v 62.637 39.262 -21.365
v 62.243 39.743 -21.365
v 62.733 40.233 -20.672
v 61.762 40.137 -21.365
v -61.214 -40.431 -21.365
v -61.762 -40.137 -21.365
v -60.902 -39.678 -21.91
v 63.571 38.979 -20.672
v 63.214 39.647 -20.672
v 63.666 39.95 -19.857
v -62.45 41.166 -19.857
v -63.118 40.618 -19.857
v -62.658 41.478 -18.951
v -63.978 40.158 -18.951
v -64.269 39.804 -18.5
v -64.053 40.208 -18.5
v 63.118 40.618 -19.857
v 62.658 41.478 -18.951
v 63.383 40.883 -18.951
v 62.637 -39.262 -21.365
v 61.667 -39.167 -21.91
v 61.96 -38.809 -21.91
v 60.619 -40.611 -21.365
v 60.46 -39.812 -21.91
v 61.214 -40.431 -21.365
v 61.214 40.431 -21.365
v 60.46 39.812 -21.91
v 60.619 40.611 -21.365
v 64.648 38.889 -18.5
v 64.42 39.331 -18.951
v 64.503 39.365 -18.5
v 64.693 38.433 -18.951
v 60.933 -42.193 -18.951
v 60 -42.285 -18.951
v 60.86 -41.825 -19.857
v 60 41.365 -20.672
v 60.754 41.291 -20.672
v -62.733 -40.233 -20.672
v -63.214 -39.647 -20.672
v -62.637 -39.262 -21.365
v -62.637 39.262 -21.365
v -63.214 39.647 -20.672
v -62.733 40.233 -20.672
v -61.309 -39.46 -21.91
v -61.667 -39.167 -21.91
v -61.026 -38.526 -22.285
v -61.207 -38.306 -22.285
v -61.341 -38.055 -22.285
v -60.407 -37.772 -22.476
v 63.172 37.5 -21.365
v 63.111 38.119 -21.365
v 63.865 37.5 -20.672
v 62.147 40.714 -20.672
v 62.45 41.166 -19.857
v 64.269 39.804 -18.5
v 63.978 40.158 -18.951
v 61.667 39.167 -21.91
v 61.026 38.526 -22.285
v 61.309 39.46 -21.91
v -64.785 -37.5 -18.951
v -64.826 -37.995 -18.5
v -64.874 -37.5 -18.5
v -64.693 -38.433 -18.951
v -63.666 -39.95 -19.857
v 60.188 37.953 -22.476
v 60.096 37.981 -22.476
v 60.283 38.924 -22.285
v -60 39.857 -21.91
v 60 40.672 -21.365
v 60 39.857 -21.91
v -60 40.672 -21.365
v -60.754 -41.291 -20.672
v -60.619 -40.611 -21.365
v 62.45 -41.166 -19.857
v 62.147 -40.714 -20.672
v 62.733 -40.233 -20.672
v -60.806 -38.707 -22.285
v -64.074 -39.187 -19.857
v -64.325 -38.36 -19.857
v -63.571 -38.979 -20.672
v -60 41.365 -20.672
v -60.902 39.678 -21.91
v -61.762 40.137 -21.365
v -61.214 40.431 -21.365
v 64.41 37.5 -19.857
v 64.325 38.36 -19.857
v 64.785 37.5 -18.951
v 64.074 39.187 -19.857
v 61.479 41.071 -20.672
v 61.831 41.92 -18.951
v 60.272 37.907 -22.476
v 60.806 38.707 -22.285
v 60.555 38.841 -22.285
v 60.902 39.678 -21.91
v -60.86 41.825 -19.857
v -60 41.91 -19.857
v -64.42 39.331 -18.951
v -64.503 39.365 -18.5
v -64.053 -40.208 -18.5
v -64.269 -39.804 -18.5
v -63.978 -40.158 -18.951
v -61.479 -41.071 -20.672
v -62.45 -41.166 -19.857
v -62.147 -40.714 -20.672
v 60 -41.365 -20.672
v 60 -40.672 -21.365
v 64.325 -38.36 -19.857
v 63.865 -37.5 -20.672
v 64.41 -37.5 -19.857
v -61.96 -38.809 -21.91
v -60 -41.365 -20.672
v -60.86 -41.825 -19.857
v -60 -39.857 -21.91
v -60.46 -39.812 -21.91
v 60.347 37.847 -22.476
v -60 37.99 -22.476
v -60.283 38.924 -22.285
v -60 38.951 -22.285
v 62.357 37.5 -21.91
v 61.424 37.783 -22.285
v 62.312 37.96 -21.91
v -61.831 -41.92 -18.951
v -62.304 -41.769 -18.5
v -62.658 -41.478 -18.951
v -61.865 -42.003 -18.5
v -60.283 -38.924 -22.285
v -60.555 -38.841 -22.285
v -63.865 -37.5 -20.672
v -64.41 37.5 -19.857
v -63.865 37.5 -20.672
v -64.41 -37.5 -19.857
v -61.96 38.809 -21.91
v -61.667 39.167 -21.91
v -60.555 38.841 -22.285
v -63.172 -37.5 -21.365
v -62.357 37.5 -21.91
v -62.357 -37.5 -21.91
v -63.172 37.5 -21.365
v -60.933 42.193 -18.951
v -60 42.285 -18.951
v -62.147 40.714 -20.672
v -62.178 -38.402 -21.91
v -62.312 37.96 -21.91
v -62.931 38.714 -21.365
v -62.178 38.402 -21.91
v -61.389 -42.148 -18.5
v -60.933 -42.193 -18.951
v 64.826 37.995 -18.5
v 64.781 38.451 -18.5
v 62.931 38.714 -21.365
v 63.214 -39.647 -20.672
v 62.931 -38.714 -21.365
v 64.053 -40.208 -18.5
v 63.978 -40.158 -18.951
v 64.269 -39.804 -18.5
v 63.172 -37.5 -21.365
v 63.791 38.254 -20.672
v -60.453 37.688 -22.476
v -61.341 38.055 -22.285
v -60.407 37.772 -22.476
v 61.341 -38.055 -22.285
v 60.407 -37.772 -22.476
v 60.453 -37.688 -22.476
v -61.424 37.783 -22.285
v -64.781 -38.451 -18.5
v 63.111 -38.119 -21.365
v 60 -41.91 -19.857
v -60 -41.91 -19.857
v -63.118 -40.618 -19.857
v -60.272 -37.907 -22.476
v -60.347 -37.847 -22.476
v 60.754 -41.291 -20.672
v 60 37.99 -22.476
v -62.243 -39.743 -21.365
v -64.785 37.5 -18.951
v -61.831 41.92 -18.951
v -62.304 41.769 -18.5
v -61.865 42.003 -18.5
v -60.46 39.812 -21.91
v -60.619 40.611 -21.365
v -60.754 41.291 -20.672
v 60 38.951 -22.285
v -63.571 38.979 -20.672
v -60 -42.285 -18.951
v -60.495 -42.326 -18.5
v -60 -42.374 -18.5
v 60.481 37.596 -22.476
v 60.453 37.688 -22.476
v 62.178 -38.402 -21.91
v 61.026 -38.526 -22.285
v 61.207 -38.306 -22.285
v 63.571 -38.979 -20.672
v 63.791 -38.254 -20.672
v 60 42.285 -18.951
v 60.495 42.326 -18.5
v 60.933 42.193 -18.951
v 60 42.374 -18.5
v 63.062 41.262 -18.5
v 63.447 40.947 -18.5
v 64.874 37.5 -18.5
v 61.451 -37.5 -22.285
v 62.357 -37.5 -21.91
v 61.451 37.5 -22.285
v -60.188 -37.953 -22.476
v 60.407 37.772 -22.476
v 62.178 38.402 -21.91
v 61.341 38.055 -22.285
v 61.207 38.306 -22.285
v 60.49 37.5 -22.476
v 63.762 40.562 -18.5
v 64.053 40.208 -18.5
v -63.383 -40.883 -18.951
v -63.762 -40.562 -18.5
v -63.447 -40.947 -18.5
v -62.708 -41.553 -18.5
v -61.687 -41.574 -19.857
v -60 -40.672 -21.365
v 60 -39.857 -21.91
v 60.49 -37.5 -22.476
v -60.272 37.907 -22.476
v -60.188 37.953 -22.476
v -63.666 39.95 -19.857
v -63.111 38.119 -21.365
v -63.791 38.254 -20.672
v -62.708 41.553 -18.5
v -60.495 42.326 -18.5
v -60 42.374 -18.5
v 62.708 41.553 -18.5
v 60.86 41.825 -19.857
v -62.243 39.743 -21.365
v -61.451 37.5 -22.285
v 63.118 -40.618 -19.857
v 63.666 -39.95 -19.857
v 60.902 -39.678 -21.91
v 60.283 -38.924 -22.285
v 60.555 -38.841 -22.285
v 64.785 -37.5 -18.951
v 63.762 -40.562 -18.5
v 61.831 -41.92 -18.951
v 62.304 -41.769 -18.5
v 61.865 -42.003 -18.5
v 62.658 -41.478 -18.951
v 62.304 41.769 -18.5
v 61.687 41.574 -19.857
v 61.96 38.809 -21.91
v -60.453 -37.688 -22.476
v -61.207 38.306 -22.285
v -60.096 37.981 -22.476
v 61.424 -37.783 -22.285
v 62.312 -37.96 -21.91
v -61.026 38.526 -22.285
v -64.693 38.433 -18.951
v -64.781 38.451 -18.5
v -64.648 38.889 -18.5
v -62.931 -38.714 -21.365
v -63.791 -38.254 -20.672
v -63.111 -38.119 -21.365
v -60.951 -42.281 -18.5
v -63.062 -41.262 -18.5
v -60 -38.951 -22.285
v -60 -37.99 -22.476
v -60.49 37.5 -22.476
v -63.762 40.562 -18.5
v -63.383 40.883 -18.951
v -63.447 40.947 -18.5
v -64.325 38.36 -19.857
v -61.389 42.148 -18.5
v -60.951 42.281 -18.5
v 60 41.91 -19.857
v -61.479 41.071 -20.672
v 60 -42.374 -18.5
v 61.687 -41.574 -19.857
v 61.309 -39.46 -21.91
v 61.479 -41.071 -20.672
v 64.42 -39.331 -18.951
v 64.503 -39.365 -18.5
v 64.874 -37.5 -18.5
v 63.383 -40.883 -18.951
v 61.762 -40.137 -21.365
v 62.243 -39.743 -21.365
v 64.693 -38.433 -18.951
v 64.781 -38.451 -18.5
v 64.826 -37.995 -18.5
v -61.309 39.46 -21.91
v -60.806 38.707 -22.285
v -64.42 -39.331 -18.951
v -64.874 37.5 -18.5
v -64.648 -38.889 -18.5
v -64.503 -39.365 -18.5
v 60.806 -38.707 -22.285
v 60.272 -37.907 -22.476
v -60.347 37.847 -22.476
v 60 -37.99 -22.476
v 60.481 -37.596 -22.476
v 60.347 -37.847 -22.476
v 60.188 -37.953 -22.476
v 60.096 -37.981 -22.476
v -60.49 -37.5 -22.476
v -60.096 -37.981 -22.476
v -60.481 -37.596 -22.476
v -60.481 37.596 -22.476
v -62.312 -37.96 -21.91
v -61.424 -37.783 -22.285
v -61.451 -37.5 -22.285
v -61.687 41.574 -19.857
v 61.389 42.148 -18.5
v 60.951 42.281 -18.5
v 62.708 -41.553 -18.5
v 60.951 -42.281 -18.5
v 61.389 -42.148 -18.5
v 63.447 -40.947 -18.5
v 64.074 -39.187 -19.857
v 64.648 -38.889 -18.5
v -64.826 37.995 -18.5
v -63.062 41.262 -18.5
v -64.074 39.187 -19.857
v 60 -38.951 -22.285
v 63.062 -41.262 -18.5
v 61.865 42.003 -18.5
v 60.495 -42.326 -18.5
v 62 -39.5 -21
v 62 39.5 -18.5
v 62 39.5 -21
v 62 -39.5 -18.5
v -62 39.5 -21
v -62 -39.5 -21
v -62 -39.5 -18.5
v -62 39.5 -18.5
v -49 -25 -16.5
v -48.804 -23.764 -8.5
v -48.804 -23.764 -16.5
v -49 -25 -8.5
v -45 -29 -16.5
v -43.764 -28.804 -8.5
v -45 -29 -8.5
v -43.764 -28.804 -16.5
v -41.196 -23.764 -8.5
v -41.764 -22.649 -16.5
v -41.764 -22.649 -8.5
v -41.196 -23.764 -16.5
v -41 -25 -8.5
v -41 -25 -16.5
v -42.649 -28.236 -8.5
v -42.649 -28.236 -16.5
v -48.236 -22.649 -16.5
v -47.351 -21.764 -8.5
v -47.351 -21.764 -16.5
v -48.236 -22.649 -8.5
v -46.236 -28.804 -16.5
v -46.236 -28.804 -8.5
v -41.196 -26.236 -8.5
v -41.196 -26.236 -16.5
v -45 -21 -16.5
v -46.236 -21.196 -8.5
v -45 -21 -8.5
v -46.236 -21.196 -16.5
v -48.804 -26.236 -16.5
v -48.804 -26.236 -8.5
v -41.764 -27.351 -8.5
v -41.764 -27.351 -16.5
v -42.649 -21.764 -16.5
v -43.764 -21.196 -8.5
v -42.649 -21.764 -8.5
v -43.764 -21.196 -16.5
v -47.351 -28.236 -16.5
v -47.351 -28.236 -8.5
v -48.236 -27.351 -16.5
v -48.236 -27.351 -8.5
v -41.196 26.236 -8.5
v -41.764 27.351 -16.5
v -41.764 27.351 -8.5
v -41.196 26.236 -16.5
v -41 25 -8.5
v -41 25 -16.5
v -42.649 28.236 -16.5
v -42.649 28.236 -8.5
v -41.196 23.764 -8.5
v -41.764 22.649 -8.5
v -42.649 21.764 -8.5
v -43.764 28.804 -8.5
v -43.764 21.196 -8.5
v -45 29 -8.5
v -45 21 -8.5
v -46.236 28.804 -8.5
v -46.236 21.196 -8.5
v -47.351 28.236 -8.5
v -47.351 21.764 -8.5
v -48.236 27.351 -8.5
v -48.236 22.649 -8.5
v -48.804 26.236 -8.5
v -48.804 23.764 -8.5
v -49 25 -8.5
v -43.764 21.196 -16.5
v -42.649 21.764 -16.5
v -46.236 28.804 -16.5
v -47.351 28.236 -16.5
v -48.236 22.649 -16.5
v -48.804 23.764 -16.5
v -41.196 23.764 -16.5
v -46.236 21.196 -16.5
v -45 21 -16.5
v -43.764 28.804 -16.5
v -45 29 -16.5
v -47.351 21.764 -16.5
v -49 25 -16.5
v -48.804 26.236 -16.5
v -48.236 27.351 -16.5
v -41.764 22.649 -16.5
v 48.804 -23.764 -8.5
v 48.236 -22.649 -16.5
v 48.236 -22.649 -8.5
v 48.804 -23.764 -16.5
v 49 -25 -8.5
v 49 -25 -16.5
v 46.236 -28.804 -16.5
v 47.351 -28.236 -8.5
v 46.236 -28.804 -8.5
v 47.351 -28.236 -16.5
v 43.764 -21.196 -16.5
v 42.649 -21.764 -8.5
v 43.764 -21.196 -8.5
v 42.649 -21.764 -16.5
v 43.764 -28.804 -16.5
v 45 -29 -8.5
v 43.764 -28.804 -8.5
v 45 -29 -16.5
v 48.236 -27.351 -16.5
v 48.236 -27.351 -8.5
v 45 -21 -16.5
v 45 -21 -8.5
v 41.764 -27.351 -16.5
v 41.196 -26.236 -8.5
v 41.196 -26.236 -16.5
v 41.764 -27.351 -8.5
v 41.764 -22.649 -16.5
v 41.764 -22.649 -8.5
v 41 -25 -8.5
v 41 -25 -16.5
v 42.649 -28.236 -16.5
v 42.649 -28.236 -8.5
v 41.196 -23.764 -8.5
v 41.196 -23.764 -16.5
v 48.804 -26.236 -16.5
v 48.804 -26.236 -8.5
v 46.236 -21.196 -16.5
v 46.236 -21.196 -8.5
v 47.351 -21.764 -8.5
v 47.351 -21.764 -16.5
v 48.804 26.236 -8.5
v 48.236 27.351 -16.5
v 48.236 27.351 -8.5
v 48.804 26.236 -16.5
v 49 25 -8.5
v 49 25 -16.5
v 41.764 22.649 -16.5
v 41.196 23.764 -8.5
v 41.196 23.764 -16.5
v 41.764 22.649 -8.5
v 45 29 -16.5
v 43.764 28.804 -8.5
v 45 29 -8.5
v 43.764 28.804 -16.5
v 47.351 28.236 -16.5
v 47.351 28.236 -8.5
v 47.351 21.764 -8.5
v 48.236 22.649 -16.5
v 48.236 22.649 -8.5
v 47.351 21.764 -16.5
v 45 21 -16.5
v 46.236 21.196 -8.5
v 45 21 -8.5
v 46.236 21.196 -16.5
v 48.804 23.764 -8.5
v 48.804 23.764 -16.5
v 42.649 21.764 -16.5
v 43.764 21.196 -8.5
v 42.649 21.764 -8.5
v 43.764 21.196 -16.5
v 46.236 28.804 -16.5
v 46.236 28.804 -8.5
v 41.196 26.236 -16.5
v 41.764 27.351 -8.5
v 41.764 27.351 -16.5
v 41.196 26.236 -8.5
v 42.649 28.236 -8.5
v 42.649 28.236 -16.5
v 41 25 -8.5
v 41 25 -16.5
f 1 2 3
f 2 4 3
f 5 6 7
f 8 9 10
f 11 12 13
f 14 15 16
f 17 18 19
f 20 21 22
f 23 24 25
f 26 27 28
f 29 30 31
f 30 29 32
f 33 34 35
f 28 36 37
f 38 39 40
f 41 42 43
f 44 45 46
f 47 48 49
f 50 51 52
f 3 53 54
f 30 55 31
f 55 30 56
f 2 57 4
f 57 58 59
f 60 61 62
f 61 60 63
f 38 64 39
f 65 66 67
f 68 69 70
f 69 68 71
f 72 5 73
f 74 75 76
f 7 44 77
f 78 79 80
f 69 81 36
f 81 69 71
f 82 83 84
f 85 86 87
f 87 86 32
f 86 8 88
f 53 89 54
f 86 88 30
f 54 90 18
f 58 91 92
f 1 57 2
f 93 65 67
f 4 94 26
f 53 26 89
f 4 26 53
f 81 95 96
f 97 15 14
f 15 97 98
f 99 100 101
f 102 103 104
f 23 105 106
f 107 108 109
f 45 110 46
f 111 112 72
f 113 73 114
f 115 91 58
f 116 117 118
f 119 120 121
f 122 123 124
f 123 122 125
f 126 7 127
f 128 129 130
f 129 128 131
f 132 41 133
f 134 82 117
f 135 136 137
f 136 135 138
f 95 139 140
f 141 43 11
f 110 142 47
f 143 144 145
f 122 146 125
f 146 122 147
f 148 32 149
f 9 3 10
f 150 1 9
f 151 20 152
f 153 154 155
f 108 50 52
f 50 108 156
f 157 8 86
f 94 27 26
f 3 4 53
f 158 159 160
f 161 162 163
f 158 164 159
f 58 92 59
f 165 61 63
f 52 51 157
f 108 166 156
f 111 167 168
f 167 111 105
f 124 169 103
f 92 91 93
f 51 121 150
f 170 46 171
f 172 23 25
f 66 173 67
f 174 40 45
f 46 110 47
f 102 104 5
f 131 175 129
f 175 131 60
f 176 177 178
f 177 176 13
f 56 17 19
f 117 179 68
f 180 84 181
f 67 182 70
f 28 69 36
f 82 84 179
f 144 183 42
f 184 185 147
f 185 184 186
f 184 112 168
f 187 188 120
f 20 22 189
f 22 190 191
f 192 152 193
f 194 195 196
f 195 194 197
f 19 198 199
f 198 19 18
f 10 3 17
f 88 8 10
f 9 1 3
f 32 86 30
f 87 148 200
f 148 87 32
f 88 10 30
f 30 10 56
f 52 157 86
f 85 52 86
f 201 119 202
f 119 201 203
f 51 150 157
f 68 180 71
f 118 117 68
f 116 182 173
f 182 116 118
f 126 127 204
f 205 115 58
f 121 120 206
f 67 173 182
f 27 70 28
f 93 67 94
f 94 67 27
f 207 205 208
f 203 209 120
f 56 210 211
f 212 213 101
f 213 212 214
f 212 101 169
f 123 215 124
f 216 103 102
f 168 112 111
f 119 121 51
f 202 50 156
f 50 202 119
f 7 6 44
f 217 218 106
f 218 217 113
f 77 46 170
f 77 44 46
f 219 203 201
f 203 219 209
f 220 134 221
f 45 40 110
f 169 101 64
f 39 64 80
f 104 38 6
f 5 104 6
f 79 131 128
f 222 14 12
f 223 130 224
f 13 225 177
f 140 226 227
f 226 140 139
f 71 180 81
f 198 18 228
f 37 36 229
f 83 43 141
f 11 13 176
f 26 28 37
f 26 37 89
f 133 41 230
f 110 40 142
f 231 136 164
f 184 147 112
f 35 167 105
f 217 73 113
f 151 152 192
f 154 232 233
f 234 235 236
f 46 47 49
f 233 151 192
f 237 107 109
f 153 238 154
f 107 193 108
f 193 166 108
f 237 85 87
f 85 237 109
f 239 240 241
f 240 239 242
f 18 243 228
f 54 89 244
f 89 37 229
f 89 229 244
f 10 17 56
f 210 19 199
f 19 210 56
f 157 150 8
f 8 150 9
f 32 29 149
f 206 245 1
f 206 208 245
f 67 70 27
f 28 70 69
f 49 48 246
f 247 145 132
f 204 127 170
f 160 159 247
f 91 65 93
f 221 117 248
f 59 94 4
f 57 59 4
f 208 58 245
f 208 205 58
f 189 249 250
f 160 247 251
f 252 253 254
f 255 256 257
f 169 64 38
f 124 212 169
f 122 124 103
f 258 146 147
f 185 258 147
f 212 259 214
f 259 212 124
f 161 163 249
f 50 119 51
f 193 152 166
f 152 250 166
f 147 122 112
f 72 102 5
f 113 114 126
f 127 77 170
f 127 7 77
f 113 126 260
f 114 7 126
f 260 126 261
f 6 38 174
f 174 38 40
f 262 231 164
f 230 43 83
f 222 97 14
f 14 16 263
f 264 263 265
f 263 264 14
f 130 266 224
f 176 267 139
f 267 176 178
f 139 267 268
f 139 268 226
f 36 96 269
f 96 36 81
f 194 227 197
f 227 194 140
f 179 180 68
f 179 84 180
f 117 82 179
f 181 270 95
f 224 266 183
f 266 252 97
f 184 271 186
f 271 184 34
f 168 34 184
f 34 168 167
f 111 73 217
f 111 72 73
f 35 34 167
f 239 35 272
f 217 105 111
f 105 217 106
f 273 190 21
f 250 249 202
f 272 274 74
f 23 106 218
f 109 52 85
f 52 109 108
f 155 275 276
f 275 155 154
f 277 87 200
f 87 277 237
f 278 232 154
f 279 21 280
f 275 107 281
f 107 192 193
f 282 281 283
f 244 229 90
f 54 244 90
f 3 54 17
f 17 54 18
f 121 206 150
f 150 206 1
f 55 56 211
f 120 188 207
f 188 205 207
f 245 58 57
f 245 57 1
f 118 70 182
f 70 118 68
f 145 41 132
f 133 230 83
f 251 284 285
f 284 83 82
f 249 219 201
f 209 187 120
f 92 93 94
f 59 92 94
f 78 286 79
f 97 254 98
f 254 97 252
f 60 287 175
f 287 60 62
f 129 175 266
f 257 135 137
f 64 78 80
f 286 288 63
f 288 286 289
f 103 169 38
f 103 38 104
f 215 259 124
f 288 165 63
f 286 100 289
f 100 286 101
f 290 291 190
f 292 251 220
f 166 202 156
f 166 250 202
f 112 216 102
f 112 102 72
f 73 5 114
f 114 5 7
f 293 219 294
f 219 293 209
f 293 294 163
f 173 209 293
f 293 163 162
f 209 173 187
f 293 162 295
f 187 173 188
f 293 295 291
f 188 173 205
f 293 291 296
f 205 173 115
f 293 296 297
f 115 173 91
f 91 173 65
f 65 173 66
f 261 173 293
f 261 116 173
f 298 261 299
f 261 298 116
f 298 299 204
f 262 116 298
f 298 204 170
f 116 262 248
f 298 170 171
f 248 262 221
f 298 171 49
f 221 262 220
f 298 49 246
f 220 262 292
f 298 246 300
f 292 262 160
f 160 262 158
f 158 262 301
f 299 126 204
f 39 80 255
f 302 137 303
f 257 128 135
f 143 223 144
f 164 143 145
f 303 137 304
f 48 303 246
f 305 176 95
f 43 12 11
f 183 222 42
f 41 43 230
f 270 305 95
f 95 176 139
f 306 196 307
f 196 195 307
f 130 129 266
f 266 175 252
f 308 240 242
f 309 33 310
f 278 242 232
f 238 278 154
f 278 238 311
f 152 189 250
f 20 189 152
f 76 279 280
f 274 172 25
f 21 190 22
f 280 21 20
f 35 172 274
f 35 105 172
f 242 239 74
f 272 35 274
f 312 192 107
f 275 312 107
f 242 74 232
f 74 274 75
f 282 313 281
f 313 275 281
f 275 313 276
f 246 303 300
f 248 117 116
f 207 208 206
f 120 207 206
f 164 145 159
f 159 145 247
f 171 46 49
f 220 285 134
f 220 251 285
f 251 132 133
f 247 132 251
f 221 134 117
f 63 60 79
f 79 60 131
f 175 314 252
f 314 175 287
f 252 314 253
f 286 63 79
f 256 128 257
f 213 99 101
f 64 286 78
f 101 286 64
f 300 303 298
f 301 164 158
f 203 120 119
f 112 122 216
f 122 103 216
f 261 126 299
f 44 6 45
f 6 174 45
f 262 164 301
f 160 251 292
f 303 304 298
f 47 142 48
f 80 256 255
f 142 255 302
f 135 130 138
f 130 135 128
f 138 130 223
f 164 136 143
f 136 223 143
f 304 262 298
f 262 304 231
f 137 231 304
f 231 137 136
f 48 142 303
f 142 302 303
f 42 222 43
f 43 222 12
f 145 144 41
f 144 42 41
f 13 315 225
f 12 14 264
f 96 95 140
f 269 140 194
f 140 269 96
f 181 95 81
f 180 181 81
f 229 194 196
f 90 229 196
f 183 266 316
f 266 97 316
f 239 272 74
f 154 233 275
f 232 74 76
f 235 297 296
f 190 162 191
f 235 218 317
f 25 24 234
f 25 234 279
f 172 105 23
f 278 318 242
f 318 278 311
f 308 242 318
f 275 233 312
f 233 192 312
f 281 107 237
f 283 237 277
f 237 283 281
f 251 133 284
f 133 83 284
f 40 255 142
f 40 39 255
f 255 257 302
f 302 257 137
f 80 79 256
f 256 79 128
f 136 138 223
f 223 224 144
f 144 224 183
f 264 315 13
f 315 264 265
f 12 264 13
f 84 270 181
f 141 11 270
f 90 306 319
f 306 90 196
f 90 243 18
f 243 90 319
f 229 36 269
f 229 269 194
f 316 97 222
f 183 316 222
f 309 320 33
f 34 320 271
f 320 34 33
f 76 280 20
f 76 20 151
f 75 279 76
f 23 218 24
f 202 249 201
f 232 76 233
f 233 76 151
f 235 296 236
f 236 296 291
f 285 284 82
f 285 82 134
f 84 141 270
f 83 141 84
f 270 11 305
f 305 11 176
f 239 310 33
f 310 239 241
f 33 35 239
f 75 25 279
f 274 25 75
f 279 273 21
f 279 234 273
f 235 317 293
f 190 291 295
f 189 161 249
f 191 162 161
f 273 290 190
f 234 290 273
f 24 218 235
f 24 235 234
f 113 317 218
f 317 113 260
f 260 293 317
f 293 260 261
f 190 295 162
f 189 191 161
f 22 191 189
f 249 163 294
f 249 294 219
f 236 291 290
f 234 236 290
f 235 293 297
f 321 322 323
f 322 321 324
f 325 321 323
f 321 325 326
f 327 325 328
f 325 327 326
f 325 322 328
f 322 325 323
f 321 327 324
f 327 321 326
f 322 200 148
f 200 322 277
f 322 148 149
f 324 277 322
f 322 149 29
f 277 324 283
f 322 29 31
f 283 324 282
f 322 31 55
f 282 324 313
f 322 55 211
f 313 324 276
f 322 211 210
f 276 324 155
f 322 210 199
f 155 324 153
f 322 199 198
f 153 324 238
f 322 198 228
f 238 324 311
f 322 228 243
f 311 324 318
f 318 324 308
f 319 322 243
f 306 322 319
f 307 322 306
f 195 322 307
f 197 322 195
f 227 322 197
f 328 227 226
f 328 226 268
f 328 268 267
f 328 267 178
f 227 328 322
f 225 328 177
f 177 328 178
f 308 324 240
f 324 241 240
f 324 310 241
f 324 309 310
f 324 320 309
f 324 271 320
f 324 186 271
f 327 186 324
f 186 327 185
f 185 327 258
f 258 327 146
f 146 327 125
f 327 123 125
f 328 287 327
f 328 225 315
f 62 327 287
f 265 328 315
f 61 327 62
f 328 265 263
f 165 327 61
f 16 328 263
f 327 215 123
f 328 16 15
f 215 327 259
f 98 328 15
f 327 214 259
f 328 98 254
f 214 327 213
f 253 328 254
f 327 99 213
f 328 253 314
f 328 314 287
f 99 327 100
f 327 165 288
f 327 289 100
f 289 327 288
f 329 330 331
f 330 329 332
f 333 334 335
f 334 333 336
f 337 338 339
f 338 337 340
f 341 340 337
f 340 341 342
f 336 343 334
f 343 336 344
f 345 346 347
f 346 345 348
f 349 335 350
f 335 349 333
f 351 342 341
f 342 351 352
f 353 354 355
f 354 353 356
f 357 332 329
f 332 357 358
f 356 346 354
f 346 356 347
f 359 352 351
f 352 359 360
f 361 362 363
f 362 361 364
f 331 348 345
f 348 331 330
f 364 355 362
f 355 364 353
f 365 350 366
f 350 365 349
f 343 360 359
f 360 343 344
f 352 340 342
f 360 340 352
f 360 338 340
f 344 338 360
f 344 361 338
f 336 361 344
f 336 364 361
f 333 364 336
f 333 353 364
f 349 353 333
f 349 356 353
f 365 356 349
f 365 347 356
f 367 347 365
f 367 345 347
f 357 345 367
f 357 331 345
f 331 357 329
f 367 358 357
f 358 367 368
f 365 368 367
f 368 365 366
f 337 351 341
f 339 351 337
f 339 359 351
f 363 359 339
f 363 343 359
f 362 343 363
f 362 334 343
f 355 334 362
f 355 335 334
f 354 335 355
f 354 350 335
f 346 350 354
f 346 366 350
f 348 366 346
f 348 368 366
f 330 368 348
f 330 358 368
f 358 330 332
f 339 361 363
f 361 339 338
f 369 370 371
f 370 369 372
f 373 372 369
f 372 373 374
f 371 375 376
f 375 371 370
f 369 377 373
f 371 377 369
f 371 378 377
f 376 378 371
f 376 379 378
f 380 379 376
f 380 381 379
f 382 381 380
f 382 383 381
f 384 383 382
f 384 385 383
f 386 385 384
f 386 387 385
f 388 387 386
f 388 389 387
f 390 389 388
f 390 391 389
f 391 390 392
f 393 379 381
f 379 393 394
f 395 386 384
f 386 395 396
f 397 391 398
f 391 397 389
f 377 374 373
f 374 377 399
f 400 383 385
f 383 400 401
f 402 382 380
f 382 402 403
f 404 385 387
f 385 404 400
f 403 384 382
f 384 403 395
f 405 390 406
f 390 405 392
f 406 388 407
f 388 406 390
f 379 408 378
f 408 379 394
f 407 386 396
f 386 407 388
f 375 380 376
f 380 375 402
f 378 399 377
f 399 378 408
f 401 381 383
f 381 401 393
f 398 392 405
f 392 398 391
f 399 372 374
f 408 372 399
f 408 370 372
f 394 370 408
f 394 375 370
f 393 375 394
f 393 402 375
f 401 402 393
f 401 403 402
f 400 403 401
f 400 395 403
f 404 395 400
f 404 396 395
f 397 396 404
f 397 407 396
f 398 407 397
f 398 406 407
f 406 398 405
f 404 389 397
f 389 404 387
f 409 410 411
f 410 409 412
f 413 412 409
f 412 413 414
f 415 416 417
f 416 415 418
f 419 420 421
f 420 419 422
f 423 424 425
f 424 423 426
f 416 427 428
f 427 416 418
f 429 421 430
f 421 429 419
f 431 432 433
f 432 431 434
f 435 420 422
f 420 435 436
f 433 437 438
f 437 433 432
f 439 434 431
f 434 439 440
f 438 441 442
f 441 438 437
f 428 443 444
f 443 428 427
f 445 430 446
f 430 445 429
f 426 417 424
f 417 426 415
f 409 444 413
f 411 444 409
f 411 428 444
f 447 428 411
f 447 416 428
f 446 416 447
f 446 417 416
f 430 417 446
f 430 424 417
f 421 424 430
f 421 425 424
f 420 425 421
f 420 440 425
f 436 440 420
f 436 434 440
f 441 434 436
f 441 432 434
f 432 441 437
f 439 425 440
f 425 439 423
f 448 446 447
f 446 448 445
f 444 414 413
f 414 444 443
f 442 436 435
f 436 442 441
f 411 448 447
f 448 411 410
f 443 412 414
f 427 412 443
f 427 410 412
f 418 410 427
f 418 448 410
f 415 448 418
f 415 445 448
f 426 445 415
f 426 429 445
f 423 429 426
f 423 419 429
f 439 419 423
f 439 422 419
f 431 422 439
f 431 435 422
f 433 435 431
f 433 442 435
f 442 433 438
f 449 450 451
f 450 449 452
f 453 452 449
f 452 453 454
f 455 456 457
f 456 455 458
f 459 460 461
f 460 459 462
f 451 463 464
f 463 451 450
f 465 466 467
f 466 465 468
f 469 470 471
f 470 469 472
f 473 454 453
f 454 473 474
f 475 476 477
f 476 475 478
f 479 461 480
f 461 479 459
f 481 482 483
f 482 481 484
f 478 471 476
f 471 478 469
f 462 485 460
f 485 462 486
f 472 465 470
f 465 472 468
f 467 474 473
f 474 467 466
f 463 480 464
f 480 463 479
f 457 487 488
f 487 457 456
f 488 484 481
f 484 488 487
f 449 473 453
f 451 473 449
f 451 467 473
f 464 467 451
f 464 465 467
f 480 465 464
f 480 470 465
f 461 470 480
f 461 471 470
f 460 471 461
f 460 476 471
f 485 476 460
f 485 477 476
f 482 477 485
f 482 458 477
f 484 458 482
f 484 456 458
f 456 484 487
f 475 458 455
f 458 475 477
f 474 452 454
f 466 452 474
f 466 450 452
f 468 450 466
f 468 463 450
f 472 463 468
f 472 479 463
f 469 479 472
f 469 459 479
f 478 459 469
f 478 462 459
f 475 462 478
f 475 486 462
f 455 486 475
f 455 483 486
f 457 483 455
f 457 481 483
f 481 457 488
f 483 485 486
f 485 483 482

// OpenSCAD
// Engine Life Prediction Device Enclosure - Parametric OpenSCAD
// Customize these variables:
length = 130;  // Outer length (X)
width = 85;    // Outer width (Y)
height = 45;   // Outer height (Z)
wall = 3;      // Wall thickness
corner_r = 5;  // Corner radius

display_w = 70;  // e.g., 2.8" TFT cutout
display_h = 50;
display_offset_x = 10;
display_offset_y = 15;

pcb_length = 110;
pcb_width = 70;
pcb_height = 5;  // Space below lid

// Main box
module enclosure() {
    difference() {
        // Outer shell with rounded corners
        minkowski() {
            cube([length - 2*corner_r, width - 2*corner_r, height - 2*corner_r], center=true);
            sphere(r=corner_r, $fn=32);
        }
        
        // Inner cavity
        translate([0,0,wall/2])
        cube([length - 2*wall, width - 2*wall, height], center=true);
    }
}

// Bottom part (base with PCB mounts)
module base() {
    difference() {
        enclosure();
        // Cut top open
        translate([0,0,wall+1]) cube([length+1, width+1, height], center=true);
        
        // Mounting holes for PCB (4x)
        for (x = [-pcb_length/2 + 10, pcb_length/2 - 10]) {
            for (y = [-pcb_width/2 + 10, pcb_width/2 - 10]) {
                translate([x, y, -height/2 + wall + 5])
                    cylinder(h=10, r=1.5, center=true, $fn=20);  // M3 holes
            }
        }
    }
    
    // PCB risers
    for (x = [-pcb_length/2 + 10, pcb_length/2 - 10]) {
        for (y = [-pcb_width/2 + 10, pcb_width/2 - 10]) {
            translate([x, y, -height/2 + wall + 3])
                cylinder(h=8, r=4, center=false, $fn=20);
        }
    }
}

// Lid with display window
module lid() {
    difference() {
        enclosure();
        // Remove bottom
        translate([0,0,-wall-1]) cube([length+1, width+1, height], center=true);
        
        // Display cutout
        translate([display_offset_x - length/2 + display_w/2, 
                   display_offset_y - width/2 + display_h/2, 
                   height/2 - wall/2])
            cube([display_w, display_h, wall+2], center=true);
        
        // Button holes (example: 4 small buttons)
        for (i = [0:3]) {
            translate([30 + i*12 - length/2, -20, height/2 - wall/2])
                cylinder(h=wall+2, r=4, center=true, $fn=20);
        }
    }
    
    // Lip for sealing
    translate([0,0,-height/2 + wall + 2])
    difference() {
        cube([length - 2*wall - 0.5, width - 2*wall - 0.5, 4], center=true);
        cube([length - 4*wall, width - 4*wall, 5], center=true);
    }
}

// Cable ports (add glands or grommets)
module ports() {
    // Side ports for sensors/power
    translate([length/2 - wall/2, 0, -5])
        rotate([0,90,0]) cylinder(h=wall+2, r=6, center=true, $fn=30);  // Power/sensor
    translate([-length/2 + wall/2, 20, -5])
        rotate([0,90,0]) cylinder(h=wall+2, r=4, center=true, $fn=30);  // Antenna or probe
}

// Assemble (uncomment one at a time or use for printing)
base();
// translate([0,0,height]) lid();  // Uncomment for lid

// Add ports to base if desired
// ports();
